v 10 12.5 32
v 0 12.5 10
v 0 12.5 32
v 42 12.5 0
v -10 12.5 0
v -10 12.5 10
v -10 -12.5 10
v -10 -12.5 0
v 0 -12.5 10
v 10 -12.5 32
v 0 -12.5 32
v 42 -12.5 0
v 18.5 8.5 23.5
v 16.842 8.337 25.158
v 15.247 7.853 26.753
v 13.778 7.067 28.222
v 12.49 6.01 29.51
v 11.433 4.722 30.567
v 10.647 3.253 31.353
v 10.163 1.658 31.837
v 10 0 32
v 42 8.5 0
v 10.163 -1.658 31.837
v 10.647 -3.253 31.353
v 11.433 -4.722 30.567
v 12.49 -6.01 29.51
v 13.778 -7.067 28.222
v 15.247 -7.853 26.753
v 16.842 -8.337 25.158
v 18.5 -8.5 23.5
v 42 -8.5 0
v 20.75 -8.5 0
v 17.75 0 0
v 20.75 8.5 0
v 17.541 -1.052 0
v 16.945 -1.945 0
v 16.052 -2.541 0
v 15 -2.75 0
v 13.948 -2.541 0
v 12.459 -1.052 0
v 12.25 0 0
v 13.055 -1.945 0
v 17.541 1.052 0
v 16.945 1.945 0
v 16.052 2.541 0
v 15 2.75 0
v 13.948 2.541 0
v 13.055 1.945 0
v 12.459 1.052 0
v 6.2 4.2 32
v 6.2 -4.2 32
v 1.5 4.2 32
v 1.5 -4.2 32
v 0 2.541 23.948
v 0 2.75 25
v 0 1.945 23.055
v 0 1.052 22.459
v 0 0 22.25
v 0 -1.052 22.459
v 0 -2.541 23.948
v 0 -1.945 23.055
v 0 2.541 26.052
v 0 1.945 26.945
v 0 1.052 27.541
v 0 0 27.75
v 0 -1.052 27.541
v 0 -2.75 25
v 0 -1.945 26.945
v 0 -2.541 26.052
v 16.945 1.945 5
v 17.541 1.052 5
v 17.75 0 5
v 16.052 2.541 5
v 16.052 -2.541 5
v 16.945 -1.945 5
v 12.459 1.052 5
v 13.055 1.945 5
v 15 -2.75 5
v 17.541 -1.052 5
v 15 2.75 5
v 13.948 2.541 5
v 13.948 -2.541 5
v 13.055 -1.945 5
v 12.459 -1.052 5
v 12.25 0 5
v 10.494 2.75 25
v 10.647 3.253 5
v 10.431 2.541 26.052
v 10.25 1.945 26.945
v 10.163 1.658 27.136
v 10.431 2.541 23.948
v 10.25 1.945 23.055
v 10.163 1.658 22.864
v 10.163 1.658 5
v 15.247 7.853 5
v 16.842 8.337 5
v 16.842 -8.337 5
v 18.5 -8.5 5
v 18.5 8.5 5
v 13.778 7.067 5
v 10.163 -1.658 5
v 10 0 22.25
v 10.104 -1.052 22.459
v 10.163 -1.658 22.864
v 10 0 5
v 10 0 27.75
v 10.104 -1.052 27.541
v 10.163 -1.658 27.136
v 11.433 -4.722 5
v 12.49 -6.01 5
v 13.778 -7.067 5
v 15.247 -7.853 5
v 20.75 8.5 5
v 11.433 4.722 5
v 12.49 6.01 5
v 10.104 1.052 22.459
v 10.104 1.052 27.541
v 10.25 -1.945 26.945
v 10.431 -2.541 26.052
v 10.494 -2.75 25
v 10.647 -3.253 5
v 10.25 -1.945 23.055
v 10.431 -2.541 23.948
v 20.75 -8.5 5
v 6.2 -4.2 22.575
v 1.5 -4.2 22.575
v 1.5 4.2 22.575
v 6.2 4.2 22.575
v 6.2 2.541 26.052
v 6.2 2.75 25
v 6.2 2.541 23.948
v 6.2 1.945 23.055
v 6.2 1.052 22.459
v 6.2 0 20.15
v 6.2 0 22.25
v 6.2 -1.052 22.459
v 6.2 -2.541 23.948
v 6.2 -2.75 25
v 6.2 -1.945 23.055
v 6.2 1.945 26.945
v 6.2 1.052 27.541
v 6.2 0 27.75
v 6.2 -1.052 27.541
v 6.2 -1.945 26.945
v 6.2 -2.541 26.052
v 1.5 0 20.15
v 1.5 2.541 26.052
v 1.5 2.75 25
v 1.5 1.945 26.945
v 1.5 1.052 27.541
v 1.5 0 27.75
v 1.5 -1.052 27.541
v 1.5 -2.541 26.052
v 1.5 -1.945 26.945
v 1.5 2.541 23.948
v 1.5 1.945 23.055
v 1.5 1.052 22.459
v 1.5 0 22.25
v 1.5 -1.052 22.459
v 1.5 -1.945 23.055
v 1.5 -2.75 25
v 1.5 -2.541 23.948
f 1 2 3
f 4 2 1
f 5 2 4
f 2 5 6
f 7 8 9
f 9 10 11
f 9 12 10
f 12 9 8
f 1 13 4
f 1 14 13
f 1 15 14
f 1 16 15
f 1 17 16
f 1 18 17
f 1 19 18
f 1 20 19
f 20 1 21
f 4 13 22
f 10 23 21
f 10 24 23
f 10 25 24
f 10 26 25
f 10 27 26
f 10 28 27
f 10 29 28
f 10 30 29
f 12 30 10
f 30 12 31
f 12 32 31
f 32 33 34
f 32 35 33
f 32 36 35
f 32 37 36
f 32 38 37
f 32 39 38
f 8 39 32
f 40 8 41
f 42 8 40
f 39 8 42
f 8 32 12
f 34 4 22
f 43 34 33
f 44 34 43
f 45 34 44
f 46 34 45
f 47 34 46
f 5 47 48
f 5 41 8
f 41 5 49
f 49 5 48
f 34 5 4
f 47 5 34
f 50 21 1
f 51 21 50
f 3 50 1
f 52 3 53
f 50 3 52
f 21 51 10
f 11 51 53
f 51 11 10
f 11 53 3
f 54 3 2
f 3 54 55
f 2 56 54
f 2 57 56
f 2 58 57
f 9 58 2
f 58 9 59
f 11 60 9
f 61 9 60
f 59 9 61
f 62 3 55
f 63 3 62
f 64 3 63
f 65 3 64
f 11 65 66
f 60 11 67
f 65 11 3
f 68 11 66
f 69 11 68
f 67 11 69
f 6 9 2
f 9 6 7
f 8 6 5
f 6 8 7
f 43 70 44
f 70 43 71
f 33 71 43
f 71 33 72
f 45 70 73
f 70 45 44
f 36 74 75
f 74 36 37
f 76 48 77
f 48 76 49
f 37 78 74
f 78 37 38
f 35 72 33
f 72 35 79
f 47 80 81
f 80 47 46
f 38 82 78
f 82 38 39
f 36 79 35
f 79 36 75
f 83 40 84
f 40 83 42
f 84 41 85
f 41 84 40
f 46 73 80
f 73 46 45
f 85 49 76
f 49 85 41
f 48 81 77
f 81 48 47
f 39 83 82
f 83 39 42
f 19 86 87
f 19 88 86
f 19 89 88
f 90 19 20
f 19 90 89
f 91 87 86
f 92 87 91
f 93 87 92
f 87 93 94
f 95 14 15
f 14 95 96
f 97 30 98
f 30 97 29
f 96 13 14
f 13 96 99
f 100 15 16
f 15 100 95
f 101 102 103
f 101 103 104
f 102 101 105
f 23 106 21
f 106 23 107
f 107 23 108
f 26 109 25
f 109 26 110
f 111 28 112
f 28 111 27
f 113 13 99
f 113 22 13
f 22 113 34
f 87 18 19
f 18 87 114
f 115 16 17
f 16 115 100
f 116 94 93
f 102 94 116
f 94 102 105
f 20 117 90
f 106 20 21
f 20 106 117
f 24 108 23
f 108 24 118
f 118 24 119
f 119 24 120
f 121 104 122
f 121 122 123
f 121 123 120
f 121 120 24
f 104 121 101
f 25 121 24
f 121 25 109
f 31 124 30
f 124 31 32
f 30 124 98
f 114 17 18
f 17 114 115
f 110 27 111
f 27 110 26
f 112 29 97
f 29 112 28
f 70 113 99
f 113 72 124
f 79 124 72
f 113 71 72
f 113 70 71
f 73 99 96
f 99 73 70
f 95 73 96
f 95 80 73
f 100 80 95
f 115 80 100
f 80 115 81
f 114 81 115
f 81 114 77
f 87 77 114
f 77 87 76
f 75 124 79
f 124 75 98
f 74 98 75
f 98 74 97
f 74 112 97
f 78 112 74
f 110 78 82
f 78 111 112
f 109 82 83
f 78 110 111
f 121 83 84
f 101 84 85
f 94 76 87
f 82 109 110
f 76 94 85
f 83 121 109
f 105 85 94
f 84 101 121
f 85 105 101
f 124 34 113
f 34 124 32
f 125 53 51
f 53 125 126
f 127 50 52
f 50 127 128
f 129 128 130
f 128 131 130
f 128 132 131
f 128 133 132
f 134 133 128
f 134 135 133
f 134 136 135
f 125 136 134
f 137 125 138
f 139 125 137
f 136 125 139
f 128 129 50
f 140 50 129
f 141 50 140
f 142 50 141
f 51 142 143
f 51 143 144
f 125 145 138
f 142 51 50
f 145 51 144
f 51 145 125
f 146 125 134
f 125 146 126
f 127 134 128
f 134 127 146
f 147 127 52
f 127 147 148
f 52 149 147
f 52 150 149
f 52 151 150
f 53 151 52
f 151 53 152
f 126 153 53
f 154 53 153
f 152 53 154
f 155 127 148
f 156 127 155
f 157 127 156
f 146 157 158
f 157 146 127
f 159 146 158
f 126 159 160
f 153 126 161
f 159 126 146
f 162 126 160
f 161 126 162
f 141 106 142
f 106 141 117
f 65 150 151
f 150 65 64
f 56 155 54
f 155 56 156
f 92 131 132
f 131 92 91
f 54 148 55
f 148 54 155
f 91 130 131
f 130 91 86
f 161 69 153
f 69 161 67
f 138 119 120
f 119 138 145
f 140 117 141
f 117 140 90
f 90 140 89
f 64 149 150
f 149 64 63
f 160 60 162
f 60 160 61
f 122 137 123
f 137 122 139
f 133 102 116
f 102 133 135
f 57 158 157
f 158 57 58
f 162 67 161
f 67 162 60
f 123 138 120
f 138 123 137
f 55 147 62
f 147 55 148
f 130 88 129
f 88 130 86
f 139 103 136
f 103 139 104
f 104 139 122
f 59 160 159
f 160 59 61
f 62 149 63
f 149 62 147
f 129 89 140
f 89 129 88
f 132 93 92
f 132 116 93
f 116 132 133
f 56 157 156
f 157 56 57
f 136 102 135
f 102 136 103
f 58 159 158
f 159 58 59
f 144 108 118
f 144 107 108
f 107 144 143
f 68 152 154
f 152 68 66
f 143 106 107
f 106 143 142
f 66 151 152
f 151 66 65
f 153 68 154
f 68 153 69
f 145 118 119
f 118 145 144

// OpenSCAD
// file: molette_m5.scad
// eLKa1
// molette_m5
// GNU GPL v3
// lkiefer <blog.lkiefer.org> and contributors
// http://www.reprap.org/wiki/ELKa
// https://github.com/kimented/elka1

include <config.scad>;

module molette_m5(){

  n=12;     // nombre de moletages
  lar=1.5;  // largeur des moletages
  h=5;      // hauteur totale
  d=15;     // diamètre extérieur
  ch=3;     // hauteur du chanfrein
  plat=8.2; // sur plats 6 pans
  vis=5.5;  // diamètre de la vis
  plat2=4;  // hauteur des plats de serrage

  echo ("molette_m5");

  color (couleur) {
    difference(){
      union(){
        translate([0,0,ch]) cylinder(h=h-ch, d=d, $fn=n*3);
        cylinder(h=ch, d2=d, d1=d-ch*2, $fn=n*3);
      }
      
      for(i=[0:1:n-1]){
        rotate([0,0,360/n*i]) translate([-lar/2,d/2-1,-1]) cube([lar,5,h+2]);
      }
      translate([0,0,h-plat2]) cylinder(d=plat*2/sqrt(3), h=plat2+1, $fn=6);
      translate([0,0,-1])cylinder(d=vis, h=h+2, $fn=16);
      //cube([30,30,30]); //coupe
    }
  }
}

molette_m5();
// file: modules.scad
// Fonctions personnalisées

//http://forum.openscad.org/Wish-mirror-copy-true-td10681.html
module copy_mirror(vec=[0,1,0])
{
    children();
    mirror(vec) children();
}

module ecrou(plat,h){
  cylinder(d=plat*2/sqrt(3), h=h, $fn=6);
}


module courroie(diam,longueur){
  color ("black")
  difference(){
    hull(){
      cylinder(d=diam+1, h=6, $fn=32);
      translate([longueur,0,0]) cylinder(d=diam+1, h=6, $fn=32);
    }
    translate([0,0,-1])
    hull(){
      cylinder(d=diam-1, h=8, $fn=32);
      translate([longueur,0,0]) cylinder(d=diam-1, h=8, $fn=32);
    }
  }
  
  
}
// file: config.scad
// Paramètres de la machine

decal=-30;            // décallage du chassis xz
hauteur=400;          // hauteur totale chassis
largeur=400;          // largeur totale chassis
longueur=470;         // longueur totale chassis
hauteur_base=90;      // hauteur de la base
entraxe_y=140;        // distance entre les tiges Ø8 axe Y
entraxe_x=45;         // distance entre les tiges Ø8 axe X

couleur=[1,0.6,0];


// Plats écrous
ec3=5.7;
ec4=7.2;
ec5=8.2;
ec6=10.2;

// Jeu sur plats pour les écrous glissants
jec=0.2;

// hauteur écrous
ec3h=2.4;
ec4h=3.2;
ec5h=4.7;
ec6h=5.2;

// Vis
vis3=3.5;
vis4=4.5;
vis5=5.5;
vis6=6.5;


// Paramètre des pièces et jeux

// écart plateau/courroie
// y_belt_holder
belt_h=13;      // écart entre la courroie et le plateau

// écart plateau/tiges lisses
// y_lm8uu
decal_plateau=12; // Décallage en Y

// décallage des tiges lisses Y
// support_tige8_y
decal_tiges=5;

// décallage moteur Y
// y_motor
decal_motory_z=11;
decal_motory_y=25;

// Equerres de fixation position fermée
eq_ec=10;      // écart entre profilés

// Fixations axe Z
pos_z=26;      // position des axes par rapport au profilé (>= 21)
hauteur_z=20;  // hauteur des fixations
entraxe_z=17;  // distance entre les tiges Ø8 et M5
// est ce que la tige de 8 dépasse du profilé de 30?
// si oui, on décale les fixations
decalx=max(-42/2+entraxe_z+8/2+2, 0);

// Roulements linéaires
lbd = 15; // diamètre ext
lbh = 24; // hauteur

// x_carriage
he_x=23;  // entraxe hotend x
he_y=23;  // entraxe hotend y
sen_x=20; // entraxe capteur x
sen_y=23; // entraxe capteur y

// sensor_holder
sen_ep=3;   // épaisseur
sen_d=12.5; // diamètre du capteur
sen_pos=0;  // décentrage en x du capteur
sen_z=7;    // position Z de la bague

// y_belt_idler
ybi_ep1=4;       // épaisseur de la partie fixe
ybi_ep2=4;       // épaisseur de la partie mobile
ybi_h=16;        // position de l'axe
ybi_ec=11;       // écart pour le passage du ou des roulement
ybi_vis=vis4;    // diamètre passage de vis (axe)
ybi_ecrou=ec4;   // plat écrou
ybi_ecrouh=ec4h; // hauteur écrou
ybi_long=60;     // longueur de la partie mobile entre axes
ybi_prof=15;     // largeur de la partie mobile


// nombre de dents des poulies
poulie=20;

// Pas des courroies
pas=2;

// diamètre des poulies
dpoulie=poulie*pas/3.1416;
// main file
// eLKa1
// equerre
// GNU GPL v3
// lkiefer <blog.lkiefer.org> and contributors
// http://www.reprap.org/wiki/ELKa
// https://github.com/kimented/elka1

include <config.scad>;
use <modules.scad>;
use <molette_m5.scad>;

module equerre3(assemblage){
  lar=25;   // largeur
  tri=32;   // triangle, hauteur
  mep=10;   // méplat
  diam=vis5; // diamètre trou
  diam2=17; // diamètre lamage
  ep=5;     // épaisseur
  lan=10;   // longueur de la languette

  vis=vis5;  // diamètre vis de serrage
  pro=30;   // profilé
  tet=10;   // diamètre tête de vis
  
  echo ("equerre3");
  // Liste vitamines
  echo ("├ écrou M5");
  echo ("└ vis H M5 x 25");
  
  color (couleur)
  translate([mep,0,0])
  difference(){
    union(){
      rotate([90,0,0]) linear_extrude(lar, center=true) polygon([[tri,0],[0,tri],[0,0]]);
      translate([-mep,-lar/2,0]) cube([mep,lar,tri]);
      translate([-mep-lan,-lar/2,0]) cube([lan,lar,eq_ec]);
    }
    //vis de fixation
    translate([tet/2,0,-1]) cylinder(h=tri+2, d=diam, $fn=16);
    // lamage
    hull(){
      translate([diam2/2,0,ep]) cylinder(h=tri+2, d=diam2, $fn=32);
      translate([tri,0,ep]) cylinder(h=tri+2, d=diam2, $fn=32);
    }
    // dégagement arrière
    translate([tet/2+diam/2+3,-diam2/2,-1]) cube([tri,diam2,ep+2]);
    // écrou
    hull(){
    translate([-mep+1.5,0,eq_ec+pro/2]) rotate([0,90,0]) ecrou(ec5+jec,ec5h);
    translate([-mep+1.5,0,tri]) rotate([0,90,0]) ecrou(ec5+jec,ec5h);
    }
    // vis de serrage
    translate([-mep-lan-1,0,eq_ec+pro/2]) rotate([0,90,0]) cylinder(h=lan+mep+tri+2, d=vis5, $fn=16);
  }
  if(assemblage==1){
   translate([mep+15,0,eq_ec+30/2]) rotate([0,90,0])  molette_m5();
  }

}

equerre3();
